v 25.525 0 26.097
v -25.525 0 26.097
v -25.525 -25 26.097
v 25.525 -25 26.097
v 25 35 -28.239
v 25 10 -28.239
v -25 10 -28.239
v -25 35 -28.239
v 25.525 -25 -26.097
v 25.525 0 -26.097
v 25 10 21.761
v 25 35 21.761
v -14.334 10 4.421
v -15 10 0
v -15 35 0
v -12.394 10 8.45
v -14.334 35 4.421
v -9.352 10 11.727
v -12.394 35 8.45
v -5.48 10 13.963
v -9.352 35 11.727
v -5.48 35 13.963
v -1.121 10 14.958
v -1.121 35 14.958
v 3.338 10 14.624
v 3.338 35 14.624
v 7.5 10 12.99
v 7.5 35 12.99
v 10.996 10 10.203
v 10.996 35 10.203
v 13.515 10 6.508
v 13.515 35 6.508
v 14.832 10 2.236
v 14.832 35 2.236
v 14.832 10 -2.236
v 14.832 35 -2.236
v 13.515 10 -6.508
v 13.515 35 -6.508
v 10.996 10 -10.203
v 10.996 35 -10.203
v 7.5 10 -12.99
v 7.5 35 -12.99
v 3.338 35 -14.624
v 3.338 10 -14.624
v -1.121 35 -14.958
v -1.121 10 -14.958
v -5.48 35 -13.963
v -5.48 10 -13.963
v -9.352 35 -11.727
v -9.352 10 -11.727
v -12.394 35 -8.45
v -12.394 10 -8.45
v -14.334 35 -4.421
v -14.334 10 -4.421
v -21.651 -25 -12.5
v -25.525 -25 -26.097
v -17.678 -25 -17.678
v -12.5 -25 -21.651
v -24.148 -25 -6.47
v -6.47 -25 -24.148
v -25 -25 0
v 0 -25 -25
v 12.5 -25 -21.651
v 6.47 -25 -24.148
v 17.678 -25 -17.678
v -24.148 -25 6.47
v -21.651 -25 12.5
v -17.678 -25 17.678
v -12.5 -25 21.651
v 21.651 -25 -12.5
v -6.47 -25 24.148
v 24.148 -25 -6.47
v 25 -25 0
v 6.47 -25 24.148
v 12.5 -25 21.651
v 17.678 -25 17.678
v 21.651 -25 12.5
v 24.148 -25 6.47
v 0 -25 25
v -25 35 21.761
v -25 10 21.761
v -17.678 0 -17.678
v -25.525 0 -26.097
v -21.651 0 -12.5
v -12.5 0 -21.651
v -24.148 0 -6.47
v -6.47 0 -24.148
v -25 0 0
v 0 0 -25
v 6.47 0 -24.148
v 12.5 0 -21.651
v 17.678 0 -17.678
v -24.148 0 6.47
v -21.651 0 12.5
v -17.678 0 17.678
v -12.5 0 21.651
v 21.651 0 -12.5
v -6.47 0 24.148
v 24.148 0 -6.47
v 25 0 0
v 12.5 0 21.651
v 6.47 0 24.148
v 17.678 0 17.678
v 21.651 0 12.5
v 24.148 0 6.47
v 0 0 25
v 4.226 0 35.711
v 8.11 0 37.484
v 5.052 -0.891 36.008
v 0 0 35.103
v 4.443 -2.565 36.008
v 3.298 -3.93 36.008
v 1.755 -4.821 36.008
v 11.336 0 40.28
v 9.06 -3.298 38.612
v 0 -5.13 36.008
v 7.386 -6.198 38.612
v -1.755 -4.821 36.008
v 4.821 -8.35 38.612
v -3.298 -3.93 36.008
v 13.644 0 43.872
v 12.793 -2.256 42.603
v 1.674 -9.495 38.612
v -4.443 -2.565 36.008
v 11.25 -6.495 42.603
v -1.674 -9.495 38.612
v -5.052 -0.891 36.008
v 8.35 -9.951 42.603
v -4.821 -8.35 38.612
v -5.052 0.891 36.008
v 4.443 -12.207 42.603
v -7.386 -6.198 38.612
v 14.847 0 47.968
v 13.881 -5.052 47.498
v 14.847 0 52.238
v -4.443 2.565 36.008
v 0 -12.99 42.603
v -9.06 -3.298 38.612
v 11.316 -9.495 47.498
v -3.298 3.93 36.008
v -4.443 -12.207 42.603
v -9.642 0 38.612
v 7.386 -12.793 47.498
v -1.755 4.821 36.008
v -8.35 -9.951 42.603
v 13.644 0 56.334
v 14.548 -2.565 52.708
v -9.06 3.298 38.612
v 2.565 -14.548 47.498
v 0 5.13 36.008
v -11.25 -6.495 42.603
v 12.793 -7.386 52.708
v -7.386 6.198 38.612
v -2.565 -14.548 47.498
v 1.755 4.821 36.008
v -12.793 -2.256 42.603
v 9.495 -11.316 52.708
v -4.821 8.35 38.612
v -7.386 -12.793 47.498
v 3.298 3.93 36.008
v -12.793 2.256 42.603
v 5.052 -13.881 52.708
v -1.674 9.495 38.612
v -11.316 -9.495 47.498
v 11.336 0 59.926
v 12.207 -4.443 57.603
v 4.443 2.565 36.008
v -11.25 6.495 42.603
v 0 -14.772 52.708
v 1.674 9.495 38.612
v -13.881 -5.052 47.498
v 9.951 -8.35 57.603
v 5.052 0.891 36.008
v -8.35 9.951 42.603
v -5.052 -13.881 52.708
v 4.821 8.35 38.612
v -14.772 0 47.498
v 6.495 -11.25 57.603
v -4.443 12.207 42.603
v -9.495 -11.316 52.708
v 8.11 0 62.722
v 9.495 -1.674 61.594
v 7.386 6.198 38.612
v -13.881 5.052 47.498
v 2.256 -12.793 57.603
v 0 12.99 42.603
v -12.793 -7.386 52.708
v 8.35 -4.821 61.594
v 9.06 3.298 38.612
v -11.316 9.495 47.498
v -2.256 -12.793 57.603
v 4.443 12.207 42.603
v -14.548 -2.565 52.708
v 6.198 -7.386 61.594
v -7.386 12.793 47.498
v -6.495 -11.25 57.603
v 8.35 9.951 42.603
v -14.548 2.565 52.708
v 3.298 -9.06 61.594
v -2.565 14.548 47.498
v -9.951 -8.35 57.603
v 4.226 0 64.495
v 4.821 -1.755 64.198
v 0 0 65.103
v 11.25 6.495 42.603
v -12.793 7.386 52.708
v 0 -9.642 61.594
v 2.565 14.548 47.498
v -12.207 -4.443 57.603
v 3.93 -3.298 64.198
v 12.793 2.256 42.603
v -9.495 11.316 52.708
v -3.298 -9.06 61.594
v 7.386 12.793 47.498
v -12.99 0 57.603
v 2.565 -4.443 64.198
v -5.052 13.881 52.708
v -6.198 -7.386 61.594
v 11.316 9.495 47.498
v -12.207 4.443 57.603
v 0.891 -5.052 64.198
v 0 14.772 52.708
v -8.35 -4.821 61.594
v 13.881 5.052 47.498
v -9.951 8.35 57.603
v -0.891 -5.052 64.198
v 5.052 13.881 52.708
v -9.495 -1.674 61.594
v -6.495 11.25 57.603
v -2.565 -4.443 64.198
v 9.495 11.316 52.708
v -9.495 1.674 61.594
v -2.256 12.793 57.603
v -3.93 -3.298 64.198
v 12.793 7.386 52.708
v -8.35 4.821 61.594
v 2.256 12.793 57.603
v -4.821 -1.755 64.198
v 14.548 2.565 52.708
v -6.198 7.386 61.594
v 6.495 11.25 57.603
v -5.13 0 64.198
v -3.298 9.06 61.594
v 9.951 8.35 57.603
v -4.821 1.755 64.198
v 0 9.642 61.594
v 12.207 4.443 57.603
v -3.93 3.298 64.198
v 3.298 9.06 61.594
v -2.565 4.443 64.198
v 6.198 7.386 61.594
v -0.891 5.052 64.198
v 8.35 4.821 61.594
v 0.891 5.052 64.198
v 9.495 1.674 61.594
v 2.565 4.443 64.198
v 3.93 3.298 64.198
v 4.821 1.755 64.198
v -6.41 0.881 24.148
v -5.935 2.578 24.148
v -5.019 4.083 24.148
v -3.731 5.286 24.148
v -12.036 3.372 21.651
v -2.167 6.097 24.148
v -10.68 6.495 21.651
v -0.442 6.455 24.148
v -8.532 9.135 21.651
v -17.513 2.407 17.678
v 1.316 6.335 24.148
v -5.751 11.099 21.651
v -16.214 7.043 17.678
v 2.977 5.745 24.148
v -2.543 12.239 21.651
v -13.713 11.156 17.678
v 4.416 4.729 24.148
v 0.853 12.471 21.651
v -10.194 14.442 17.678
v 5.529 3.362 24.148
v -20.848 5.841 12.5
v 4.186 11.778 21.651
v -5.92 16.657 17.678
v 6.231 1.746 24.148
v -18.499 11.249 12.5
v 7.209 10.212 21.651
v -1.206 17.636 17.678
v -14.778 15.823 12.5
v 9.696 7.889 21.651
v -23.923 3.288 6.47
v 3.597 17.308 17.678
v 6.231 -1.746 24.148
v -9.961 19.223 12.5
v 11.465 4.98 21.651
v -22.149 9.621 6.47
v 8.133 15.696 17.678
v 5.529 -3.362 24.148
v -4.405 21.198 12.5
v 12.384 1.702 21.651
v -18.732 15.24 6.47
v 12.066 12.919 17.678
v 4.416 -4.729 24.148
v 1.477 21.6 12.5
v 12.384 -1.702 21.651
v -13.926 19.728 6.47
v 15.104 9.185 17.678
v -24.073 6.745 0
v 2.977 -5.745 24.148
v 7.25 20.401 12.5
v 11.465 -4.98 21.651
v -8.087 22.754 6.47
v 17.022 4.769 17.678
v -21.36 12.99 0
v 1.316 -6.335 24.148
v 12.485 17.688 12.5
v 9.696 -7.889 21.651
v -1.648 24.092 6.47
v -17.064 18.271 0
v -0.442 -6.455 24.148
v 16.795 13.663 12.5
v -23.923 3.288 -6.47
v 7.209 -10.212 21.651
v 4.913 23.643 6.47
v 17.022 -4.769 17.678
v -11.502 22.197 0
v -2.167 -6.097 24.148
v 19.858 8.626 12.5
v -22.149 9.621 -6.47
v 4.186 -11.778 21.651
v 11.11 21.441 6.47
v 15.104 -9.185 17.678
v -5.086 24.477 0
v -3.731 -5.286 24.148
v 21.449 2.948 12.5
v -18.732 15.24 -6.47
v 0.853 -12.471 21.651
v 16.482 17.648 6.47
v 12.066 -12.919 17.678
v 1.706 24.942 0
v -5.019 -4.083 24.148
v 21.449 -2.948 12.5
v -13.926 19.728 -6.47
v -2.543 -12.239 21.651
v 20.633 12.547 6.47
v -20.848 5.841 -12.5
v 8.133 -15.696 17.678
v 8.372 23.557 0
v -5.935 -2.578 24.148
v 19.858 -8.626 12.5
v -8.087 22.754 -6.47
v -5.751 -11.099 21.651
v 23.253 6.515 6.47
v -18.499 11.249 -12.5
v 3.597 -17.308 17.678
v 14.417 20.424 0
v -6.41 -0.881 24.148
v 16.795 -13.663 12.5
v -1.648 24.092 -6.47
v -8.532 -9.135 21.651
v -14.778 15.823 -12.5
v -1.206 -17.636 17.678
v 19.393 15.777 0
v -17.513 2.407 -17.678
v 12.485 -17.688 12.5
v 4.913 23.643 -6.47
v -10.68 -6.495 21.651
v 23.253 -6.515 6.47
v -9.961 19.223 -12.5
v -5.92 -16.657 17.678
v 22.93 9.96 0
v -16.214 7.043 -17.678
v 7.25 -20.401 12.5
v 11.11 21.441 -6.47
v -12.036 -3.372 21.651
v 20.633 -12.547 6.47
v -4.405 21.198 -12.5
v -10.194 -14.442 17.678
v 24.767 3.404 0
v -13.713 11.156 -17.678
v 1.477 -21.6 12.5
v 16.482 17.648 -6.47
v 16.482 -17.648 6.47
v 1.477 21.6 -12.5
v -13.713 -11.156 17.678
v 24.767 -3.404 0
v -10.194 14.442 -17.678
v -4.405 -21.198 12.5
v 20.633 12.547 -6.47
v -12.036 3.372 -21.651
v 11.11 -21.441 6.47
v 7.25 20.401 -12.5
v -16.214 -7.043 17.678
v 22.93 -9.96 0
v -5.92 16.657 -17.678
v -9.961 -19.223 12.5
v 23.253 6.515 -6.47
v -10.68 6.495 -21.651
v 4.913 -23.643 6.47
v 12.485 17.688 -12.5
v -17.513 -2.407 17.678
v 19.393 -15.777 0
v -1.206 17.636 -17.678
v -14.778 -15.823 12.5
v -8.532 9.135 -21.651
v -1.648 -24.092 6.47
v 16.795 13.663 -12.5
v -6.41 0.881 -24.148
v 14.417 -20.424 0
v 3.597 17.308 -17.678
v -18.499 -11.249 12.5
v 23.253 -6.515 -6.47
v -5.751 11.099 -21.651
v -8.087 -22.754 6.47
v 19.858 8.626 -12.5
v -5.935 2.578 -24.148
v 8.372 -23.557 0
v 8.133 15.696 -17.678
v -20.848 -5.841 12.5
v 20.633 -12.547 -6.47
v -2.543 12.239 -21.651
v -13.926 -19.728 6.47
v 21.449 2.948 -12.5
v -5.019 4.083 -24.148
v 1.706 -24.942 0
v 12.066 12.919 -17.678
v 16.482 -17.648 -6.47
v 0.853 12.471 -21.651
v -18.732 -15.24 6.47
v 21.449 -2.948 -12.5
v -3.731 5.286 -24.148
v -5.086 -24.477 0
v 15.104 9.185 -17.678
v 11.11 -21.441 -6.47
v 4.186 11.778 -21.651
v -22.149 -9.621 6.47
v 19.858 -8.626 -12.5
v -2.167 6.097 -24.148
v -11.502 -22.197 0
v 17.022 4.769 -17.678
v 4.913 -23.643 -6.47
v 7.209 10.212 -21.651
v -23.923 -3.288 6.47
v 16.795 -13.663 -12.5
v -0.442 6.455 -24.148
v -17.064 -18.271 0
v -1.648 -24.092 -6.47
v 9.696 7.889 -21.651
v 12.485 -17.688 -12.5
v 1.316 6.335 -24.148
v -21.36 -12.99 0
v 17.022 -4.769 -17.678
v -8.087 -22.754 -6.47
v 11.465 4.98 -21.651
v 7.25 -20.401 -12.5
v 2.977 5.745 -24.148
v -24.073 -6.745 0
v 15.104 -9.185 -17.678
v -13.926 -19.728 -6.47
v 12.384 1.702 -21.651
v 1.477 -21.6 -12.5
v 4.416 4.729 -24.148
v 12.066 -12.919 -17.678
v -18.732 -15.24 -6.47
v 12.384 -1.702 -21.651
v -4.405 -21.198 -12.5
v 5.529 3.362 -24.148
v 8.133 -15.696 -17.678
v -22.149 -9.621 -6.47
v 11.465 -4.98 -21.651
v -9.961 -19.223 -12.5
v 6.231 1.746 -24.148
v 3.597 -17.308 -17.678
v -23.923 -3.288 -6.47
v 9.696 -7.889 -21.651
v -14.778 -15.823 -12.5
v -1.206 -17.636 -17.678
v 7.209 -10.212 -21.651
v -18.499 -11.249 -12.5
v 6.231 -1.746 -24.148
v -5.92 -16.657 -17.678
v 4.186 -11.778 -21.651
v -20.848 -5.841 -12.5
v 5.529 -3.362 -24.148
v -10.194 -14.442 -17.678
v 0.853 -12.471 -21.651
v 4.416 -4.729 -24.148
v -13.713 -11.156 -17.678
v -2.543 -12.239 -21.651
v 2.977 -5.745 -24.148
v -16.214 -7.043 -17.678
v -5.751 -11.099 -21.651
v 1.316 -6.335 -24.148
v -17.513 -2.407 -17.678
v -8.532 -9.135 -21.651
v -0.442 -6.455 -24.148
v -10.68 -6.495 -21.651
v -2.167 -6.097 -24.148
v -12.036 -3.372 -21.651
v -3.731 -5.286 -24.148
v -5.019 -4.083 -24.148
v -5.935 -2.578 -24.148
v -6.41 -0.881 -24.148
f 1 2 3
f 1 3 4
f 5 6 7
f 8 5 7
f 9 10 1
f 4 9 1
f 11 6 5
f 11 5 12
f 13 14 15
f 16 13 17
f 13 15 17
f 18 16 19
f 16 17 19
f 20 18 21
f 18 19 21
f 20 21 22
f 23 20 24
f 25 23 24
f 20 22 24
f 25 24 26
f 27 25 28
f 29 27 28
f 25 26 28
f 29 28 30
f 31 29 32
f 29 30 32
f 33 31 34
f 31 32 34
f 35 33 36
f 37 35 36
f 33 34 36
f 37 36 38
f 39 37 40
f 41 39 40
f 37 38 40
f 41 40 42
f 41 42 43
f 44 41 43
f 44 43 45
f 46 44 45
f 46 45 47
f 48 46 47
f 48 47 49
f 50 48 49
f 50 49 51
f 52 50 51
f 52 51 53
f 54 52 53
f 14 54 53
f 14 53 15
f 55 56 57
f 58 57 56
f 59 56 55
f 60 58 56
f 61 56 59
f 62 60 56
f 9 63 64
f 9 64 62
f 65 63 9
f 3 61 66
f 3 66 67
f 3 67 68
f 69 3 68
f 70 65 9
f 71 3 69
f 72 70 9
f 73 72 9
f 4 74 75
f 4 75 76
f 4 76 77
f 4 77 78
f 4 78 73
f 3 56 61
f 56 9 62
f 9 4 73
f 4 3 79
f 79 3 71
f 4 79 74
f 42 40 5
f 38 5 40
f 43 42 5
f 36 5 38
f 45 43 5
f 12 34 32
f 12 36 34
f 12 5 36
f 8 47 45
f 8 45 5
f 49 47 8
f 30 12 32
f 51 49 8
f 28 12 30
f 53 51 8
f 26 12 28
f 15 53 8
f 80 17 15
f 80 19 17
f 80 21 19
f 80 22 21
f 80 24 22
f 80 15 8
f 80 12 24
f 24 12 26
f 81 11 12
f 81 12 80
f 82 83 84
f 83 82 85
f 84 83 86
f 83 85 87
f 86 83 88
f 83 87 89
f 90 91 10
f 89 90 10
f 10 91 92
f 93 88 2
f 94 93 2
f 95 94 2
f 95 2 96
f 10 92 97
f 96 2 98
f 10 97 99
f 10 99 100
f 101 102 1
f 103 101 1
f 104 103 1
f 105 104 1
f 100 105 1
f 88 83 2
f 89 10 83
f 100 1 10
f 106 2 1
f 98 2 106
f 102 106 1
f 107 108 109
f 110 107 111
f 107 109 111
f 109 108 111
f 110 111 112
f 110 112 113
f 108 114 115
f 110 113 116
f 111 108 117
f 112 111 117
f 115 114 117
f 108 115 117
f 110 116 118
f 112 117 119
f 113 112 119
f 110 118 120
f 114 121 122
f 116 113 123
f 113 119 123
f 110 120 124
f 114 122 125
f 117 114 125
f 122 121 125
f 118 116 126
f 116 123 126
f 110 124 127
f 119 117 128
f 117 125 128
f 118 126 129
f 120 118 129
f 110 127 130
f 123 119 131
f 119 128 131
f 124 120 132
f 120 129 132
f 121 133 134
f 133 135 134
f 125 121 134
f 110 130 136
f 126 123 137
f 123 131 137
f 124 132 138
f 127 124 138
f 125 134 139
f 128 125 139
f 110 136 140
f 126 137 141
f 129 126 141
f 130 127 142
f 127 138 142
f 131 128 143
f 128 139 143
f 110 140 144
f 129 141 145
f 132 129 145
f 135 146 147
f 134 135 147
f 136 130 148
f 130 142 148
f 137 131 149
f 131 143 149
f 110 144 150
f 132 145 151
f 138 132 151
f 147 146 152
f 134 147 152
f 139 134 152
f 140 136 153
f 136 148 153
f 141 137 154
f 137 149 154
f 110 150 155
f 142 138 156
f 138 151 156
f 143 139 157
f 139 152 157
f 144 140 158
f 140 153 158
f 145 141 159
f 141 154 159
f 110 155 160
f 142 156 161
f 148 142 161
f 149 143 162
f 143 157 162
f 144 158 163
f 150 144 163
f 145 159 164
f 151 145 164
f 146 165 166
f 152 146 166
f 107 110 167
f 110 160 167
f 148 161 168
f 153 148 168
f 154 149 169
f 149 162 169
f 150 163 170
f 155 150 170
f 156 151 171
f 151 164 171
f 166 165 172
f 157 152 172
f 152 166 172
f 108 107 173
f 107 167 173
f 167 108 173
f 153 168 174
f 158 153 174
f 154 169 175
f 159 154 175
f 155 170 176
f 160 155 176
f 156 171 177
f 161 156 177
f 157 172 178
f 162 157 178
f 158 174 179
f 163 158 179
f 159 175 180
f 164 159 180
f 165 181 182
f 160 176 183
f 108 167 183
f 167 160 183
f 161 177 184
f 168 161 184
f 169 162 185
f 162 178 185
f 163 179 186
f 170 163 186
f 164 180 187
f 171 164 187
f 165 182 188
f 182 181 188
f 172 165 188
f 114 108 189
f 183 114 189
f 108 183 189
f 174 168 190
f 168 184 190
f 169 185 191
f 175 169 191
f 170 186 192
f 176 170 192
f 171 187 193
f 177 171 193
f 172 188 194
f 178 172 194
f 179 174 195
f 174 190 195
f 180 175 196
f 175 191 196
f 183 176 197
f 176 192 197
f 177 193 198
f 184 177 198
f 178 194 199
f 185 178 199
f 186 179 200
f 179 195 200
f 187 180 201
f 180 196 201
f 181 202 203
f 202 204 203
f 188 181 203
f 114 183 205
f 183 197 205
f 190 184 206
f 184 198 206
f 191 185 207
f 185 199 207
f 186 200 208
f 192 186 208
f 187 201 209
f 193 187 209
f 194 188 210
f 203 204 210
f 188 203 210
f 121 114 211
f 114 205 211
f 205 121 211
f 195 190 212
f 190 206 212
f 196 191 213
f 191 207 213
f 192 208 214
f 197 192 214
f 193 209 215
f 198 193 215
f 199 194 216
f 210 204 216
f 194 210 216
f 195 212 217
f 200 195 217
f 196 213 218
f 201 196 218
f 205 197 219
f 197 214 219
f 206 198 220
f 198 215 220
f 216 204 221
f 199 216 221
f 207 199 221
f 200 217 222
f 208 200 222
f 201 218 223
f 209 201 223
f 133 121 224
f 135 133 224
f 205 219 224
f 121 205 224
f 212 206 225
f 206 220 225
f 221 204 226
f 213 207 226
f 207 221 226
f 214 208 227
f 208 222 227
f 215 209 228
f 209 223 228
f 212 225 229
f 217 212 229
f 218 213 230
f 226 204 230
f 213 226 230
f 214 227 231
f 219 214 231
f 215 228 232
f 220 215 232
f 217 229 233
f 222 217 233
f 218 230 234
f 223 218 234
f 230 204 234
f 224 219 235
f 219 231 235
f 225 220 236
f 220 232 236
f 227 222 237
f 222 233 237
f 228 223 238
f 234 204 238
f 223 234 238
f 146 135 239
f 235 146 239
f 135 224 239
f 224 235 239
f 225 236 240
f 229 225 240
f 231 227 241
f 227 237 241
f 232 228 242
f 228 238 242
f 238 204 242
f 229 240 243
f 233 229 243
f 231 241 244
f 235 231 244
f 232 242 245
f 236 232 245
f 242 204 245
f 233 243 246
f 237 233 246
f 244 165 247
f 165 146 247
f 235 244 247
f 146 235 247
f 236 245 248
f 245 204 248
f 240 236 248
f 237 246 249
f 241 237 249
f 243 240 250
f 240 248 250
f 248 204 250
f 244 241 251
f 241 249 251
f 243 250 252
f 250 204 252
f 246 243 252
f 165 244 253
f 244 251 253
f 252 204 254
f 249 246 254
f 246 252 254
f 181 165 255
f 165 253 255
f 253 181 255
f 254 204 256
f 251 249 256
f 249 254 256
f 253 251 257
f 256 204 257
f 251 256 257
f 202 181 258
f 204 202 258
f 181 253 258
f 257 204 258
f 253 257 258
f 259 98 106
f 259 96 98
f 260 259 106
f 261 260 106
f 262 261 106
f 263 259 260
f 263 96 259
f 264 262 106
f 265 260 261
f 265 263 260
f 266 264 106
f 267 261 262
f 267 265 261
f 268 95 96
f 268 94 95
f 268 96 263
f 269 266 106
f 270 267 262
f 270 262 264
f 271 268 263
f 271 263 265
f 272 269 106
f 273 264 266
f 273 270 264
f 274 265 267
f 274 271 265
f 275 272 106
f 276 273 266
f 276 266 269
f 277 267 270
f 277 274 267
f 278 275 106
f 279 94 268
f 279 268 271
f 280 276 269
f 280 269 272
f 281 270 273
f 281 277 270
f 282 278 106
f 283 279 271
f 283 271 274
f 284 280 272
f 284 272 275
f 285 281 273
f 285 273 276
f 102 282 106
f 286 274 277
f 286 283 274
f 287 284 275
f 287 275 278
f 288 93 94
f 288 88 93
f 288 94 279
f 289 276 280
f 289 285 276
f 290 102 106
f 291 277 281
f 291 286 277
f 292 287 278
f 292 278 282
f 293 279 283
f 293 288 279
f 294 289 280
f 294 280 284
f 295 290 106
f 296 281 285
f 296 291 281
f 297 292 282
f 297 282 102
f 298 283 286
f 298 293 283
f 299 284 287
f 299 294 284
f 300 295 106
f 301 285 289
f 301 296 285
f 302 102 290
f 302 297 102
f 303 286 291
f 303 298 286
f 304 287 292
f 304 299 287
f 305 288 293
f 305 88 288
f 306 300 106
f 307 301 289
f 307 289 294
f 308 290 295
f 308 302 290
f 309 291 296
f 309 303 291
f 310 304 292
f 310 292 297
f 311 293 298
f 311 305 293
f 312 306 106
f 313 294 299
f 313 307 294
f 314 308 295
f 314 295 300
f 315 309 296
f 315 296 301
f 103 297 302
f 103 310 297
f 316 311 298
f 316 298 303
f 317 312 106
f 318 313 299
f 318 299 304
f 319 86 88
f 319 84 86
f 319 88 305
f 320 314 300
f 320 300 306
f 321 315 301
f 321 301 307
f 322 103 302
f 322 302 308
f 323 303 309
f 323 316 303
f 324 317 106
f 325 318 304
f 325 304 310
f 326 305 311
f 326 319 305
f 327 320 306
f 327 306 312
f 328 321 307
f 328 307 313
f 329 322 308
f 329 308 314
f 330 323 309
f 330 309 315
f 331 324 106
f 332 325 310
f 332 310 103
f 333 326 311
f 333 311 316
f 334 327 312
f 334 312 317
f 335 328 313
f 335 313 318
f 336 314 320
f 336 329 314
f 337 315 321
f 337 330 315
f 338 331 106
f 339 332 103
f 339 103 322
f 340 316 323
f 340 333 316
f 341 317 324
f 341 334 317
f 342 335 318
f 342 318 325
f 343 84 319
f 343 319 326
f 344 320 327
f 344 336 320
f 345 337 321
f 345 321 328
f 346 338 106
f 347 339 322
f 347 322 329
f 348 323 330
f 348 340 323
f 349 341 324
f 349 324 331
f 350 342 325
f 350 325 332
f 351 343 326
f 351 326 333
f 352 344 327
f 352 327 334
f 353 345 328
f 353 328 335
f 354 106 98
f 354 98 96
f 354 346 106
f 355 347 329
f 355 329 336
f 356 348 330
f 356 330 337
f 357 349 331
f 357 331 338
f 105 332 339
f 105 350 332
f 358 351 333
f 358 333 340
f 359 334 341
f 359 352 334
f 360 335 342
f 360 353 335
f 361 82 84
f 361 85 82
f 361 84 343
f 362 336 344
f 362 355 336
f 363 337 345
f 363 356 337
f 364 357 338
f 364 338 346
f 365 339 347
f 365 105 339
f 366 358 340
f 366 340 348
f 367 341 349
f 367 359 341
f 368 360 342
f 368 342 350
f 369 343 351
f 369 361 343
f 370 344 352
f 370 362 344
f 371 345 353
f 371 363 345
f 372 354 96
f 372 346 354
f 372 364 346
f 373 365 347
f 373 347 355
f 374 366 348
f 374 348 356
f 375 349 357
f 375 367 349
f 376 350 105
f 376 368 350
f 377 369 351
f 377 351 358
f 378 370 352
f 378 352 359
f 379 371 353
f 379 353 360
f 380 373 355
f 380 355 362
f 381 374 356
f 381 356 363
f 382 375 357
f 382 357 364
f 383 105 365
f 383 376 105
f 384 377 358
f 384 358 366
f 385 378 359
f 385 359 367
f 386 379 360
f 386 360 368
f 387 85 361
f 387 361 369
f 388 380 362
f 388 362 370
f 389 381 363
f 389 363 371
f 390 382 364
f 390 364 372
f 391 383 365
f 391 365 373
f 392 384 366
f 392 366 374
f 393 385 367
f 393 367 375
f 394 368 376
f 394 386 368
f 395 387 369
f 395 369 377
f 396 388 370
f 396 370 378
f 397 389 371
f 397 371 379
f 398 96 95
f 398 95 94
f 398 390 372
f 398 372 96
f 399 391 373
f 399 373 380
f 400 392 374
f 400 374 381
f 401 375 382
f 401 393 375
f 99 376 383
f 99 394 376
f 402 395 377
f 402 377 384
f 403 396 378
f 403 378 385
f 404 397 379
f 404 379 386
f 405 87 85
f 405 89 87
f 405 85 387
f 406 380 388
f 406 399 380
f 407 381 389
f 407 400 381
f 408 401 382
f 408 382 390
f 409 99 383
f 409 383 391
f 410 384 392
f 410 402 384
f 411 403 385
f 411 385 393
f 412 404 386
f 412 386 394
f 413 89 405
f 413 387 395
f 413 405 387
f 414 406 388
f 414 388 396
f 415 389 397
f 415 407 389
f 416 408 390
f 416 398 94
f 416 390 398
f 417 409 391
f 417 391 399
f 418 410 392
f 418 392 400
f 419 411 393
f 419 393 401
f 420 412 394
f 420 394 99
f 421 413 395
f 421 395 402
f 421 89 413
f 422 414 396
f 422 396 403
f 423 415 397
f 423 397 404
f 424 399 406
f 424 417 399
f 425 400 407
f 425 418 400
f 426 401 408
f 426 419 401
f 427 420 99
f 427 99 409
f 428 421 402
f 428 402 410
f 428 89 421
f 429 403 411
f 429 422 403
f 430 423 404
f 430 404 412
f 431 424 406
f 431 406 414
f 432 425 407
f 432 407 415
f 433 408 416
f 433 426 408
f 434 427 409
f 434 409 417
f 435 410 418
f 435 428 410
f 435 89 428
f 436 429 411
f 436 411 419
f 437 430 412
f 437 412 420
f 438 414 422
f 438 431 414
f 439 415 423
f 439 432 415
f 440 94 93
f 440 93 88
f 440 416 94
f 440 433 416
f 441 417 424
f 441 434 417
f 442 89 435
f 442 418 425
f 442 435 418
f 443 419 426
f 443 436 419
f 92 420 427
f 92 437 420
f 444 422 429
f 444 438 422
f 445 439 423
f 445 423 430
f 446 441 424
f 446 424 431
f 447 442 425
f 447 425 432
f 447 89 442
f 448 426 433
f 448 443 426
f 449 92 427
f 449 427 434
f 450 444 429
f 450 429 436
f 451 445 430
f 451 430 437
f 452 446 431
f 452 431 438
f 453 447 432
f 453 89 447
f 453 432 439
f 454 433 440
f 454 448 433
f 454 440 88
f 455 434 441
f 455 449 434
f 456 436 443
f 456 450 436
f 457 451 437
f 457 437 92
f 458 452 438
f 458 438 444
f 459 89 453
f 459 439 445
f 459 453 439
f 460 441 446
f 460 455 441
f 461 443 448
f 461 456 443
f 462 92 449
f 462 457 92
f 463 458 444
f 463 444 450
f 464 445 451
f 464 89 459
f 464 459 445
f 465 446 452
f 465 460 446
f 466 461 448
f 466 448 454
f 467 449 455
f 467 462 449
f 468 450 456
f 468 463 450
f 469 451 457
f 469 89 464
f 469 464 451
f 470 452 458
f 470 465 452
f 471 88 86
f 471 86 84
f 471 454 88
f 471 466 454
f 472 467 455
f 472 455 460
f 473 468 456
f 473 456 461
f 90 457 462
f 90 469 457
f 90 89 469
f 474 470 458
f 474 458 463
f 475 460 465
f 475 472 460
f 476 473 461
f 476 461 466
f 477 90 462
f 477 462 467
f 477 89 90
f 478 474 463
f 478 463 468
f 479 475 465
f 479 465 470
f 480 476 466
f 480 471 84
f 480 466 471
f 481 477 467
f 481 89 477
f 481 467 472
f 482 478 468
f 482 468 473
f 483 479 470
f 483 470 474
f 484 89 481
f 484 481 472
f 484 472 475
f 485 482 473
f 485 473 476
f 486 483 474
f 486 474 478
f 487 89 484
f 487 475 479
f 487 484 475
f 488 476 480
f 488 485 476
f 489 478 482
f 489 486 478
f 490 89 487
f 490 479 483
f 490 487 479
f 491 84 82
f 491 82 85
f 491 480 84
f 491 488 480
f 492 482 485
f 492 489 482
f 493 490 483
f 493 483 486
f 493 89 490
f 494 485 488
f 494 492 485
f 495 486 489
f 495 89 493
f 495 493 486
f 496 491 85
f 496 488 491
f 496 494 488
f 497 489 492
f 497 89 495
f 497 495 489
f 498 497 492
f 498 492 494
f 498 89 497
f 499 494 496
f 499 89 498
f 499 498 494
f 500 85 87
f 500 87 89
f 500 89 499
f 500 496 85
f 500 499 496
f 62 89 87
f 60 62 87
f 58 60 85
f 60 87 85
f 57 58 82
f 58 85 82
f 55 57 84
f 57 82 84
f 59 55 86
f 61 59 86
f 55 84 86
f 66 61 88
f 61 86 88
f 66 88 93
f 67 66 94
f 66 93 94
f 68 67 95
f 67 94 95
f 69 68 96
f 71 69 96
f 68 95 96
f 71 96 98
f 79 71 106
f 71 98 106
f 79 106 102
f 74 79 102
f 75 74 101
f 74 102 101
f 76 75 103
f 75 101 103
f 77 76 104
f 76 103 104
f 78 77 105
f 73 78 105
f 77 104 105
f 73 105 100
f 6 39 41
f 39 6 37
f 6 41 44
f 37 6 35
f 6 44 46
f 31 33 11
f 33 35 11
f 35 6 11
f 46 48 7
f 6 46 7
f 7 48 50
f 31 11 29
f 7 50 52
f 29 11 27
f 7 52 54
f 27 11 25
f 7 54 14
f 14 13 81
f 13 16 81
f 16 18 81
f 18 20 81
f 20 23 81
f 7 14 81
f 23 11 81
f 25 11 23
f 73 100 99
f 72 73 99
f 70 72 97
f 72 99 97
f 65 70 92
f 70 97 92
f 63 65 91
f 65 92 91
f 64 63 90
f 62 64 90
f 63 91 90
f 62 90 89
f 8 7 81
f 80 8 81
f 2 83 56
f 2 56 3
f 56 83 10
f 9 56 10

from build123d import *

# Parameters (mm, degrees)
F0_W      = 51.050145179
F0_H      = 52.1947704256
F2_DEPTH  = 25
F6_W      = 50
F6_H      = 50
F7_DEPTH  = 25
F8_R      = 15
F9_DEPTH  = 25
F10_DEPTH = 50


with BuildPart() as f1:
    # F0 (on Front) → F1 (revolve)
    with BuildSketch(Plane.XZ):
        with BuildLine():
            Line((0, -25), (0, 25))
            ThreePointArc((0, 25), (-25, 0), (0, -25))
        make_face()
    revolve(axis=Axis((0, 0, 0), (0, 0, -1)))


with BuildPart() as f2:
    # F0 (on Front) → F2 (new body)
    with BuildSketch(Plane.XZ):
        Rectangle(F0_W, F0_H)
        with BuildLine():
            ThreePointArc((0, 25), (17.6776695297, 17.6776695297), (25, 0))
            ThreePointArc((25, 0), (17.6776695297, -17.6776695297), (0, -25))
            ThreePointArc((0, -25), (-25, 0), (0, 25))
        make_face(mode=Mode.SUBTRACT)
    extrude(amount=F2_DEPTH)


with BuildPart() as f4:
    # F3 (on Front) → F4 (revolve)
    with BuildSketch(Plane.XZ):
        with BuildLine():
            ThreePointArc((0, 35.1029468172), (10.6066017178, 39.4963450994), (15, 50.1029468172))
            ThreePointArc((15, 50.1029468172), (10.6066017178, 60.709548535), (0, 65.1029468172))
            Line((0, 65.1029468172), (0, 35.1029468172))
        make_face()
    revolve(axis=Axis((0, 0, 50.1029468172), (0, 0, -1)))


with BuildPart() as f7:
    # F6 (on offset) → F7 (new body)
    with BuildSketch(Plane(origin=(0, 10, 0), x_dir=(-1, 0, 0), z_dir=(0, 1, 0))):
        with Locations((0, -3.2393227814)):
            Rectangle(F6_W, F6_H)
    extrude(amount=F7_DEPTH)

    # F8 (on face) → F9 (join)
    with BuildSketch(Plane(origin=(0, 35, 0), x_dir=(-1, 0, 0), z_dir=(0, 1, 0))):
        Circle(F8_R)
    extrude(amount=F9_DEPTH)

    # F10 (cut): a face of the model
    f10_faces = [f7.faces().sort_by_distance(p)[0] for p in [
        (0, 60, 0),
    ]]
    extrude(f10_faces, amount=-F10_DEPTH, mode=Mode.SUBTRACT)


solid = Compound([f1.part, f2.part, f4.part, f7.part])
